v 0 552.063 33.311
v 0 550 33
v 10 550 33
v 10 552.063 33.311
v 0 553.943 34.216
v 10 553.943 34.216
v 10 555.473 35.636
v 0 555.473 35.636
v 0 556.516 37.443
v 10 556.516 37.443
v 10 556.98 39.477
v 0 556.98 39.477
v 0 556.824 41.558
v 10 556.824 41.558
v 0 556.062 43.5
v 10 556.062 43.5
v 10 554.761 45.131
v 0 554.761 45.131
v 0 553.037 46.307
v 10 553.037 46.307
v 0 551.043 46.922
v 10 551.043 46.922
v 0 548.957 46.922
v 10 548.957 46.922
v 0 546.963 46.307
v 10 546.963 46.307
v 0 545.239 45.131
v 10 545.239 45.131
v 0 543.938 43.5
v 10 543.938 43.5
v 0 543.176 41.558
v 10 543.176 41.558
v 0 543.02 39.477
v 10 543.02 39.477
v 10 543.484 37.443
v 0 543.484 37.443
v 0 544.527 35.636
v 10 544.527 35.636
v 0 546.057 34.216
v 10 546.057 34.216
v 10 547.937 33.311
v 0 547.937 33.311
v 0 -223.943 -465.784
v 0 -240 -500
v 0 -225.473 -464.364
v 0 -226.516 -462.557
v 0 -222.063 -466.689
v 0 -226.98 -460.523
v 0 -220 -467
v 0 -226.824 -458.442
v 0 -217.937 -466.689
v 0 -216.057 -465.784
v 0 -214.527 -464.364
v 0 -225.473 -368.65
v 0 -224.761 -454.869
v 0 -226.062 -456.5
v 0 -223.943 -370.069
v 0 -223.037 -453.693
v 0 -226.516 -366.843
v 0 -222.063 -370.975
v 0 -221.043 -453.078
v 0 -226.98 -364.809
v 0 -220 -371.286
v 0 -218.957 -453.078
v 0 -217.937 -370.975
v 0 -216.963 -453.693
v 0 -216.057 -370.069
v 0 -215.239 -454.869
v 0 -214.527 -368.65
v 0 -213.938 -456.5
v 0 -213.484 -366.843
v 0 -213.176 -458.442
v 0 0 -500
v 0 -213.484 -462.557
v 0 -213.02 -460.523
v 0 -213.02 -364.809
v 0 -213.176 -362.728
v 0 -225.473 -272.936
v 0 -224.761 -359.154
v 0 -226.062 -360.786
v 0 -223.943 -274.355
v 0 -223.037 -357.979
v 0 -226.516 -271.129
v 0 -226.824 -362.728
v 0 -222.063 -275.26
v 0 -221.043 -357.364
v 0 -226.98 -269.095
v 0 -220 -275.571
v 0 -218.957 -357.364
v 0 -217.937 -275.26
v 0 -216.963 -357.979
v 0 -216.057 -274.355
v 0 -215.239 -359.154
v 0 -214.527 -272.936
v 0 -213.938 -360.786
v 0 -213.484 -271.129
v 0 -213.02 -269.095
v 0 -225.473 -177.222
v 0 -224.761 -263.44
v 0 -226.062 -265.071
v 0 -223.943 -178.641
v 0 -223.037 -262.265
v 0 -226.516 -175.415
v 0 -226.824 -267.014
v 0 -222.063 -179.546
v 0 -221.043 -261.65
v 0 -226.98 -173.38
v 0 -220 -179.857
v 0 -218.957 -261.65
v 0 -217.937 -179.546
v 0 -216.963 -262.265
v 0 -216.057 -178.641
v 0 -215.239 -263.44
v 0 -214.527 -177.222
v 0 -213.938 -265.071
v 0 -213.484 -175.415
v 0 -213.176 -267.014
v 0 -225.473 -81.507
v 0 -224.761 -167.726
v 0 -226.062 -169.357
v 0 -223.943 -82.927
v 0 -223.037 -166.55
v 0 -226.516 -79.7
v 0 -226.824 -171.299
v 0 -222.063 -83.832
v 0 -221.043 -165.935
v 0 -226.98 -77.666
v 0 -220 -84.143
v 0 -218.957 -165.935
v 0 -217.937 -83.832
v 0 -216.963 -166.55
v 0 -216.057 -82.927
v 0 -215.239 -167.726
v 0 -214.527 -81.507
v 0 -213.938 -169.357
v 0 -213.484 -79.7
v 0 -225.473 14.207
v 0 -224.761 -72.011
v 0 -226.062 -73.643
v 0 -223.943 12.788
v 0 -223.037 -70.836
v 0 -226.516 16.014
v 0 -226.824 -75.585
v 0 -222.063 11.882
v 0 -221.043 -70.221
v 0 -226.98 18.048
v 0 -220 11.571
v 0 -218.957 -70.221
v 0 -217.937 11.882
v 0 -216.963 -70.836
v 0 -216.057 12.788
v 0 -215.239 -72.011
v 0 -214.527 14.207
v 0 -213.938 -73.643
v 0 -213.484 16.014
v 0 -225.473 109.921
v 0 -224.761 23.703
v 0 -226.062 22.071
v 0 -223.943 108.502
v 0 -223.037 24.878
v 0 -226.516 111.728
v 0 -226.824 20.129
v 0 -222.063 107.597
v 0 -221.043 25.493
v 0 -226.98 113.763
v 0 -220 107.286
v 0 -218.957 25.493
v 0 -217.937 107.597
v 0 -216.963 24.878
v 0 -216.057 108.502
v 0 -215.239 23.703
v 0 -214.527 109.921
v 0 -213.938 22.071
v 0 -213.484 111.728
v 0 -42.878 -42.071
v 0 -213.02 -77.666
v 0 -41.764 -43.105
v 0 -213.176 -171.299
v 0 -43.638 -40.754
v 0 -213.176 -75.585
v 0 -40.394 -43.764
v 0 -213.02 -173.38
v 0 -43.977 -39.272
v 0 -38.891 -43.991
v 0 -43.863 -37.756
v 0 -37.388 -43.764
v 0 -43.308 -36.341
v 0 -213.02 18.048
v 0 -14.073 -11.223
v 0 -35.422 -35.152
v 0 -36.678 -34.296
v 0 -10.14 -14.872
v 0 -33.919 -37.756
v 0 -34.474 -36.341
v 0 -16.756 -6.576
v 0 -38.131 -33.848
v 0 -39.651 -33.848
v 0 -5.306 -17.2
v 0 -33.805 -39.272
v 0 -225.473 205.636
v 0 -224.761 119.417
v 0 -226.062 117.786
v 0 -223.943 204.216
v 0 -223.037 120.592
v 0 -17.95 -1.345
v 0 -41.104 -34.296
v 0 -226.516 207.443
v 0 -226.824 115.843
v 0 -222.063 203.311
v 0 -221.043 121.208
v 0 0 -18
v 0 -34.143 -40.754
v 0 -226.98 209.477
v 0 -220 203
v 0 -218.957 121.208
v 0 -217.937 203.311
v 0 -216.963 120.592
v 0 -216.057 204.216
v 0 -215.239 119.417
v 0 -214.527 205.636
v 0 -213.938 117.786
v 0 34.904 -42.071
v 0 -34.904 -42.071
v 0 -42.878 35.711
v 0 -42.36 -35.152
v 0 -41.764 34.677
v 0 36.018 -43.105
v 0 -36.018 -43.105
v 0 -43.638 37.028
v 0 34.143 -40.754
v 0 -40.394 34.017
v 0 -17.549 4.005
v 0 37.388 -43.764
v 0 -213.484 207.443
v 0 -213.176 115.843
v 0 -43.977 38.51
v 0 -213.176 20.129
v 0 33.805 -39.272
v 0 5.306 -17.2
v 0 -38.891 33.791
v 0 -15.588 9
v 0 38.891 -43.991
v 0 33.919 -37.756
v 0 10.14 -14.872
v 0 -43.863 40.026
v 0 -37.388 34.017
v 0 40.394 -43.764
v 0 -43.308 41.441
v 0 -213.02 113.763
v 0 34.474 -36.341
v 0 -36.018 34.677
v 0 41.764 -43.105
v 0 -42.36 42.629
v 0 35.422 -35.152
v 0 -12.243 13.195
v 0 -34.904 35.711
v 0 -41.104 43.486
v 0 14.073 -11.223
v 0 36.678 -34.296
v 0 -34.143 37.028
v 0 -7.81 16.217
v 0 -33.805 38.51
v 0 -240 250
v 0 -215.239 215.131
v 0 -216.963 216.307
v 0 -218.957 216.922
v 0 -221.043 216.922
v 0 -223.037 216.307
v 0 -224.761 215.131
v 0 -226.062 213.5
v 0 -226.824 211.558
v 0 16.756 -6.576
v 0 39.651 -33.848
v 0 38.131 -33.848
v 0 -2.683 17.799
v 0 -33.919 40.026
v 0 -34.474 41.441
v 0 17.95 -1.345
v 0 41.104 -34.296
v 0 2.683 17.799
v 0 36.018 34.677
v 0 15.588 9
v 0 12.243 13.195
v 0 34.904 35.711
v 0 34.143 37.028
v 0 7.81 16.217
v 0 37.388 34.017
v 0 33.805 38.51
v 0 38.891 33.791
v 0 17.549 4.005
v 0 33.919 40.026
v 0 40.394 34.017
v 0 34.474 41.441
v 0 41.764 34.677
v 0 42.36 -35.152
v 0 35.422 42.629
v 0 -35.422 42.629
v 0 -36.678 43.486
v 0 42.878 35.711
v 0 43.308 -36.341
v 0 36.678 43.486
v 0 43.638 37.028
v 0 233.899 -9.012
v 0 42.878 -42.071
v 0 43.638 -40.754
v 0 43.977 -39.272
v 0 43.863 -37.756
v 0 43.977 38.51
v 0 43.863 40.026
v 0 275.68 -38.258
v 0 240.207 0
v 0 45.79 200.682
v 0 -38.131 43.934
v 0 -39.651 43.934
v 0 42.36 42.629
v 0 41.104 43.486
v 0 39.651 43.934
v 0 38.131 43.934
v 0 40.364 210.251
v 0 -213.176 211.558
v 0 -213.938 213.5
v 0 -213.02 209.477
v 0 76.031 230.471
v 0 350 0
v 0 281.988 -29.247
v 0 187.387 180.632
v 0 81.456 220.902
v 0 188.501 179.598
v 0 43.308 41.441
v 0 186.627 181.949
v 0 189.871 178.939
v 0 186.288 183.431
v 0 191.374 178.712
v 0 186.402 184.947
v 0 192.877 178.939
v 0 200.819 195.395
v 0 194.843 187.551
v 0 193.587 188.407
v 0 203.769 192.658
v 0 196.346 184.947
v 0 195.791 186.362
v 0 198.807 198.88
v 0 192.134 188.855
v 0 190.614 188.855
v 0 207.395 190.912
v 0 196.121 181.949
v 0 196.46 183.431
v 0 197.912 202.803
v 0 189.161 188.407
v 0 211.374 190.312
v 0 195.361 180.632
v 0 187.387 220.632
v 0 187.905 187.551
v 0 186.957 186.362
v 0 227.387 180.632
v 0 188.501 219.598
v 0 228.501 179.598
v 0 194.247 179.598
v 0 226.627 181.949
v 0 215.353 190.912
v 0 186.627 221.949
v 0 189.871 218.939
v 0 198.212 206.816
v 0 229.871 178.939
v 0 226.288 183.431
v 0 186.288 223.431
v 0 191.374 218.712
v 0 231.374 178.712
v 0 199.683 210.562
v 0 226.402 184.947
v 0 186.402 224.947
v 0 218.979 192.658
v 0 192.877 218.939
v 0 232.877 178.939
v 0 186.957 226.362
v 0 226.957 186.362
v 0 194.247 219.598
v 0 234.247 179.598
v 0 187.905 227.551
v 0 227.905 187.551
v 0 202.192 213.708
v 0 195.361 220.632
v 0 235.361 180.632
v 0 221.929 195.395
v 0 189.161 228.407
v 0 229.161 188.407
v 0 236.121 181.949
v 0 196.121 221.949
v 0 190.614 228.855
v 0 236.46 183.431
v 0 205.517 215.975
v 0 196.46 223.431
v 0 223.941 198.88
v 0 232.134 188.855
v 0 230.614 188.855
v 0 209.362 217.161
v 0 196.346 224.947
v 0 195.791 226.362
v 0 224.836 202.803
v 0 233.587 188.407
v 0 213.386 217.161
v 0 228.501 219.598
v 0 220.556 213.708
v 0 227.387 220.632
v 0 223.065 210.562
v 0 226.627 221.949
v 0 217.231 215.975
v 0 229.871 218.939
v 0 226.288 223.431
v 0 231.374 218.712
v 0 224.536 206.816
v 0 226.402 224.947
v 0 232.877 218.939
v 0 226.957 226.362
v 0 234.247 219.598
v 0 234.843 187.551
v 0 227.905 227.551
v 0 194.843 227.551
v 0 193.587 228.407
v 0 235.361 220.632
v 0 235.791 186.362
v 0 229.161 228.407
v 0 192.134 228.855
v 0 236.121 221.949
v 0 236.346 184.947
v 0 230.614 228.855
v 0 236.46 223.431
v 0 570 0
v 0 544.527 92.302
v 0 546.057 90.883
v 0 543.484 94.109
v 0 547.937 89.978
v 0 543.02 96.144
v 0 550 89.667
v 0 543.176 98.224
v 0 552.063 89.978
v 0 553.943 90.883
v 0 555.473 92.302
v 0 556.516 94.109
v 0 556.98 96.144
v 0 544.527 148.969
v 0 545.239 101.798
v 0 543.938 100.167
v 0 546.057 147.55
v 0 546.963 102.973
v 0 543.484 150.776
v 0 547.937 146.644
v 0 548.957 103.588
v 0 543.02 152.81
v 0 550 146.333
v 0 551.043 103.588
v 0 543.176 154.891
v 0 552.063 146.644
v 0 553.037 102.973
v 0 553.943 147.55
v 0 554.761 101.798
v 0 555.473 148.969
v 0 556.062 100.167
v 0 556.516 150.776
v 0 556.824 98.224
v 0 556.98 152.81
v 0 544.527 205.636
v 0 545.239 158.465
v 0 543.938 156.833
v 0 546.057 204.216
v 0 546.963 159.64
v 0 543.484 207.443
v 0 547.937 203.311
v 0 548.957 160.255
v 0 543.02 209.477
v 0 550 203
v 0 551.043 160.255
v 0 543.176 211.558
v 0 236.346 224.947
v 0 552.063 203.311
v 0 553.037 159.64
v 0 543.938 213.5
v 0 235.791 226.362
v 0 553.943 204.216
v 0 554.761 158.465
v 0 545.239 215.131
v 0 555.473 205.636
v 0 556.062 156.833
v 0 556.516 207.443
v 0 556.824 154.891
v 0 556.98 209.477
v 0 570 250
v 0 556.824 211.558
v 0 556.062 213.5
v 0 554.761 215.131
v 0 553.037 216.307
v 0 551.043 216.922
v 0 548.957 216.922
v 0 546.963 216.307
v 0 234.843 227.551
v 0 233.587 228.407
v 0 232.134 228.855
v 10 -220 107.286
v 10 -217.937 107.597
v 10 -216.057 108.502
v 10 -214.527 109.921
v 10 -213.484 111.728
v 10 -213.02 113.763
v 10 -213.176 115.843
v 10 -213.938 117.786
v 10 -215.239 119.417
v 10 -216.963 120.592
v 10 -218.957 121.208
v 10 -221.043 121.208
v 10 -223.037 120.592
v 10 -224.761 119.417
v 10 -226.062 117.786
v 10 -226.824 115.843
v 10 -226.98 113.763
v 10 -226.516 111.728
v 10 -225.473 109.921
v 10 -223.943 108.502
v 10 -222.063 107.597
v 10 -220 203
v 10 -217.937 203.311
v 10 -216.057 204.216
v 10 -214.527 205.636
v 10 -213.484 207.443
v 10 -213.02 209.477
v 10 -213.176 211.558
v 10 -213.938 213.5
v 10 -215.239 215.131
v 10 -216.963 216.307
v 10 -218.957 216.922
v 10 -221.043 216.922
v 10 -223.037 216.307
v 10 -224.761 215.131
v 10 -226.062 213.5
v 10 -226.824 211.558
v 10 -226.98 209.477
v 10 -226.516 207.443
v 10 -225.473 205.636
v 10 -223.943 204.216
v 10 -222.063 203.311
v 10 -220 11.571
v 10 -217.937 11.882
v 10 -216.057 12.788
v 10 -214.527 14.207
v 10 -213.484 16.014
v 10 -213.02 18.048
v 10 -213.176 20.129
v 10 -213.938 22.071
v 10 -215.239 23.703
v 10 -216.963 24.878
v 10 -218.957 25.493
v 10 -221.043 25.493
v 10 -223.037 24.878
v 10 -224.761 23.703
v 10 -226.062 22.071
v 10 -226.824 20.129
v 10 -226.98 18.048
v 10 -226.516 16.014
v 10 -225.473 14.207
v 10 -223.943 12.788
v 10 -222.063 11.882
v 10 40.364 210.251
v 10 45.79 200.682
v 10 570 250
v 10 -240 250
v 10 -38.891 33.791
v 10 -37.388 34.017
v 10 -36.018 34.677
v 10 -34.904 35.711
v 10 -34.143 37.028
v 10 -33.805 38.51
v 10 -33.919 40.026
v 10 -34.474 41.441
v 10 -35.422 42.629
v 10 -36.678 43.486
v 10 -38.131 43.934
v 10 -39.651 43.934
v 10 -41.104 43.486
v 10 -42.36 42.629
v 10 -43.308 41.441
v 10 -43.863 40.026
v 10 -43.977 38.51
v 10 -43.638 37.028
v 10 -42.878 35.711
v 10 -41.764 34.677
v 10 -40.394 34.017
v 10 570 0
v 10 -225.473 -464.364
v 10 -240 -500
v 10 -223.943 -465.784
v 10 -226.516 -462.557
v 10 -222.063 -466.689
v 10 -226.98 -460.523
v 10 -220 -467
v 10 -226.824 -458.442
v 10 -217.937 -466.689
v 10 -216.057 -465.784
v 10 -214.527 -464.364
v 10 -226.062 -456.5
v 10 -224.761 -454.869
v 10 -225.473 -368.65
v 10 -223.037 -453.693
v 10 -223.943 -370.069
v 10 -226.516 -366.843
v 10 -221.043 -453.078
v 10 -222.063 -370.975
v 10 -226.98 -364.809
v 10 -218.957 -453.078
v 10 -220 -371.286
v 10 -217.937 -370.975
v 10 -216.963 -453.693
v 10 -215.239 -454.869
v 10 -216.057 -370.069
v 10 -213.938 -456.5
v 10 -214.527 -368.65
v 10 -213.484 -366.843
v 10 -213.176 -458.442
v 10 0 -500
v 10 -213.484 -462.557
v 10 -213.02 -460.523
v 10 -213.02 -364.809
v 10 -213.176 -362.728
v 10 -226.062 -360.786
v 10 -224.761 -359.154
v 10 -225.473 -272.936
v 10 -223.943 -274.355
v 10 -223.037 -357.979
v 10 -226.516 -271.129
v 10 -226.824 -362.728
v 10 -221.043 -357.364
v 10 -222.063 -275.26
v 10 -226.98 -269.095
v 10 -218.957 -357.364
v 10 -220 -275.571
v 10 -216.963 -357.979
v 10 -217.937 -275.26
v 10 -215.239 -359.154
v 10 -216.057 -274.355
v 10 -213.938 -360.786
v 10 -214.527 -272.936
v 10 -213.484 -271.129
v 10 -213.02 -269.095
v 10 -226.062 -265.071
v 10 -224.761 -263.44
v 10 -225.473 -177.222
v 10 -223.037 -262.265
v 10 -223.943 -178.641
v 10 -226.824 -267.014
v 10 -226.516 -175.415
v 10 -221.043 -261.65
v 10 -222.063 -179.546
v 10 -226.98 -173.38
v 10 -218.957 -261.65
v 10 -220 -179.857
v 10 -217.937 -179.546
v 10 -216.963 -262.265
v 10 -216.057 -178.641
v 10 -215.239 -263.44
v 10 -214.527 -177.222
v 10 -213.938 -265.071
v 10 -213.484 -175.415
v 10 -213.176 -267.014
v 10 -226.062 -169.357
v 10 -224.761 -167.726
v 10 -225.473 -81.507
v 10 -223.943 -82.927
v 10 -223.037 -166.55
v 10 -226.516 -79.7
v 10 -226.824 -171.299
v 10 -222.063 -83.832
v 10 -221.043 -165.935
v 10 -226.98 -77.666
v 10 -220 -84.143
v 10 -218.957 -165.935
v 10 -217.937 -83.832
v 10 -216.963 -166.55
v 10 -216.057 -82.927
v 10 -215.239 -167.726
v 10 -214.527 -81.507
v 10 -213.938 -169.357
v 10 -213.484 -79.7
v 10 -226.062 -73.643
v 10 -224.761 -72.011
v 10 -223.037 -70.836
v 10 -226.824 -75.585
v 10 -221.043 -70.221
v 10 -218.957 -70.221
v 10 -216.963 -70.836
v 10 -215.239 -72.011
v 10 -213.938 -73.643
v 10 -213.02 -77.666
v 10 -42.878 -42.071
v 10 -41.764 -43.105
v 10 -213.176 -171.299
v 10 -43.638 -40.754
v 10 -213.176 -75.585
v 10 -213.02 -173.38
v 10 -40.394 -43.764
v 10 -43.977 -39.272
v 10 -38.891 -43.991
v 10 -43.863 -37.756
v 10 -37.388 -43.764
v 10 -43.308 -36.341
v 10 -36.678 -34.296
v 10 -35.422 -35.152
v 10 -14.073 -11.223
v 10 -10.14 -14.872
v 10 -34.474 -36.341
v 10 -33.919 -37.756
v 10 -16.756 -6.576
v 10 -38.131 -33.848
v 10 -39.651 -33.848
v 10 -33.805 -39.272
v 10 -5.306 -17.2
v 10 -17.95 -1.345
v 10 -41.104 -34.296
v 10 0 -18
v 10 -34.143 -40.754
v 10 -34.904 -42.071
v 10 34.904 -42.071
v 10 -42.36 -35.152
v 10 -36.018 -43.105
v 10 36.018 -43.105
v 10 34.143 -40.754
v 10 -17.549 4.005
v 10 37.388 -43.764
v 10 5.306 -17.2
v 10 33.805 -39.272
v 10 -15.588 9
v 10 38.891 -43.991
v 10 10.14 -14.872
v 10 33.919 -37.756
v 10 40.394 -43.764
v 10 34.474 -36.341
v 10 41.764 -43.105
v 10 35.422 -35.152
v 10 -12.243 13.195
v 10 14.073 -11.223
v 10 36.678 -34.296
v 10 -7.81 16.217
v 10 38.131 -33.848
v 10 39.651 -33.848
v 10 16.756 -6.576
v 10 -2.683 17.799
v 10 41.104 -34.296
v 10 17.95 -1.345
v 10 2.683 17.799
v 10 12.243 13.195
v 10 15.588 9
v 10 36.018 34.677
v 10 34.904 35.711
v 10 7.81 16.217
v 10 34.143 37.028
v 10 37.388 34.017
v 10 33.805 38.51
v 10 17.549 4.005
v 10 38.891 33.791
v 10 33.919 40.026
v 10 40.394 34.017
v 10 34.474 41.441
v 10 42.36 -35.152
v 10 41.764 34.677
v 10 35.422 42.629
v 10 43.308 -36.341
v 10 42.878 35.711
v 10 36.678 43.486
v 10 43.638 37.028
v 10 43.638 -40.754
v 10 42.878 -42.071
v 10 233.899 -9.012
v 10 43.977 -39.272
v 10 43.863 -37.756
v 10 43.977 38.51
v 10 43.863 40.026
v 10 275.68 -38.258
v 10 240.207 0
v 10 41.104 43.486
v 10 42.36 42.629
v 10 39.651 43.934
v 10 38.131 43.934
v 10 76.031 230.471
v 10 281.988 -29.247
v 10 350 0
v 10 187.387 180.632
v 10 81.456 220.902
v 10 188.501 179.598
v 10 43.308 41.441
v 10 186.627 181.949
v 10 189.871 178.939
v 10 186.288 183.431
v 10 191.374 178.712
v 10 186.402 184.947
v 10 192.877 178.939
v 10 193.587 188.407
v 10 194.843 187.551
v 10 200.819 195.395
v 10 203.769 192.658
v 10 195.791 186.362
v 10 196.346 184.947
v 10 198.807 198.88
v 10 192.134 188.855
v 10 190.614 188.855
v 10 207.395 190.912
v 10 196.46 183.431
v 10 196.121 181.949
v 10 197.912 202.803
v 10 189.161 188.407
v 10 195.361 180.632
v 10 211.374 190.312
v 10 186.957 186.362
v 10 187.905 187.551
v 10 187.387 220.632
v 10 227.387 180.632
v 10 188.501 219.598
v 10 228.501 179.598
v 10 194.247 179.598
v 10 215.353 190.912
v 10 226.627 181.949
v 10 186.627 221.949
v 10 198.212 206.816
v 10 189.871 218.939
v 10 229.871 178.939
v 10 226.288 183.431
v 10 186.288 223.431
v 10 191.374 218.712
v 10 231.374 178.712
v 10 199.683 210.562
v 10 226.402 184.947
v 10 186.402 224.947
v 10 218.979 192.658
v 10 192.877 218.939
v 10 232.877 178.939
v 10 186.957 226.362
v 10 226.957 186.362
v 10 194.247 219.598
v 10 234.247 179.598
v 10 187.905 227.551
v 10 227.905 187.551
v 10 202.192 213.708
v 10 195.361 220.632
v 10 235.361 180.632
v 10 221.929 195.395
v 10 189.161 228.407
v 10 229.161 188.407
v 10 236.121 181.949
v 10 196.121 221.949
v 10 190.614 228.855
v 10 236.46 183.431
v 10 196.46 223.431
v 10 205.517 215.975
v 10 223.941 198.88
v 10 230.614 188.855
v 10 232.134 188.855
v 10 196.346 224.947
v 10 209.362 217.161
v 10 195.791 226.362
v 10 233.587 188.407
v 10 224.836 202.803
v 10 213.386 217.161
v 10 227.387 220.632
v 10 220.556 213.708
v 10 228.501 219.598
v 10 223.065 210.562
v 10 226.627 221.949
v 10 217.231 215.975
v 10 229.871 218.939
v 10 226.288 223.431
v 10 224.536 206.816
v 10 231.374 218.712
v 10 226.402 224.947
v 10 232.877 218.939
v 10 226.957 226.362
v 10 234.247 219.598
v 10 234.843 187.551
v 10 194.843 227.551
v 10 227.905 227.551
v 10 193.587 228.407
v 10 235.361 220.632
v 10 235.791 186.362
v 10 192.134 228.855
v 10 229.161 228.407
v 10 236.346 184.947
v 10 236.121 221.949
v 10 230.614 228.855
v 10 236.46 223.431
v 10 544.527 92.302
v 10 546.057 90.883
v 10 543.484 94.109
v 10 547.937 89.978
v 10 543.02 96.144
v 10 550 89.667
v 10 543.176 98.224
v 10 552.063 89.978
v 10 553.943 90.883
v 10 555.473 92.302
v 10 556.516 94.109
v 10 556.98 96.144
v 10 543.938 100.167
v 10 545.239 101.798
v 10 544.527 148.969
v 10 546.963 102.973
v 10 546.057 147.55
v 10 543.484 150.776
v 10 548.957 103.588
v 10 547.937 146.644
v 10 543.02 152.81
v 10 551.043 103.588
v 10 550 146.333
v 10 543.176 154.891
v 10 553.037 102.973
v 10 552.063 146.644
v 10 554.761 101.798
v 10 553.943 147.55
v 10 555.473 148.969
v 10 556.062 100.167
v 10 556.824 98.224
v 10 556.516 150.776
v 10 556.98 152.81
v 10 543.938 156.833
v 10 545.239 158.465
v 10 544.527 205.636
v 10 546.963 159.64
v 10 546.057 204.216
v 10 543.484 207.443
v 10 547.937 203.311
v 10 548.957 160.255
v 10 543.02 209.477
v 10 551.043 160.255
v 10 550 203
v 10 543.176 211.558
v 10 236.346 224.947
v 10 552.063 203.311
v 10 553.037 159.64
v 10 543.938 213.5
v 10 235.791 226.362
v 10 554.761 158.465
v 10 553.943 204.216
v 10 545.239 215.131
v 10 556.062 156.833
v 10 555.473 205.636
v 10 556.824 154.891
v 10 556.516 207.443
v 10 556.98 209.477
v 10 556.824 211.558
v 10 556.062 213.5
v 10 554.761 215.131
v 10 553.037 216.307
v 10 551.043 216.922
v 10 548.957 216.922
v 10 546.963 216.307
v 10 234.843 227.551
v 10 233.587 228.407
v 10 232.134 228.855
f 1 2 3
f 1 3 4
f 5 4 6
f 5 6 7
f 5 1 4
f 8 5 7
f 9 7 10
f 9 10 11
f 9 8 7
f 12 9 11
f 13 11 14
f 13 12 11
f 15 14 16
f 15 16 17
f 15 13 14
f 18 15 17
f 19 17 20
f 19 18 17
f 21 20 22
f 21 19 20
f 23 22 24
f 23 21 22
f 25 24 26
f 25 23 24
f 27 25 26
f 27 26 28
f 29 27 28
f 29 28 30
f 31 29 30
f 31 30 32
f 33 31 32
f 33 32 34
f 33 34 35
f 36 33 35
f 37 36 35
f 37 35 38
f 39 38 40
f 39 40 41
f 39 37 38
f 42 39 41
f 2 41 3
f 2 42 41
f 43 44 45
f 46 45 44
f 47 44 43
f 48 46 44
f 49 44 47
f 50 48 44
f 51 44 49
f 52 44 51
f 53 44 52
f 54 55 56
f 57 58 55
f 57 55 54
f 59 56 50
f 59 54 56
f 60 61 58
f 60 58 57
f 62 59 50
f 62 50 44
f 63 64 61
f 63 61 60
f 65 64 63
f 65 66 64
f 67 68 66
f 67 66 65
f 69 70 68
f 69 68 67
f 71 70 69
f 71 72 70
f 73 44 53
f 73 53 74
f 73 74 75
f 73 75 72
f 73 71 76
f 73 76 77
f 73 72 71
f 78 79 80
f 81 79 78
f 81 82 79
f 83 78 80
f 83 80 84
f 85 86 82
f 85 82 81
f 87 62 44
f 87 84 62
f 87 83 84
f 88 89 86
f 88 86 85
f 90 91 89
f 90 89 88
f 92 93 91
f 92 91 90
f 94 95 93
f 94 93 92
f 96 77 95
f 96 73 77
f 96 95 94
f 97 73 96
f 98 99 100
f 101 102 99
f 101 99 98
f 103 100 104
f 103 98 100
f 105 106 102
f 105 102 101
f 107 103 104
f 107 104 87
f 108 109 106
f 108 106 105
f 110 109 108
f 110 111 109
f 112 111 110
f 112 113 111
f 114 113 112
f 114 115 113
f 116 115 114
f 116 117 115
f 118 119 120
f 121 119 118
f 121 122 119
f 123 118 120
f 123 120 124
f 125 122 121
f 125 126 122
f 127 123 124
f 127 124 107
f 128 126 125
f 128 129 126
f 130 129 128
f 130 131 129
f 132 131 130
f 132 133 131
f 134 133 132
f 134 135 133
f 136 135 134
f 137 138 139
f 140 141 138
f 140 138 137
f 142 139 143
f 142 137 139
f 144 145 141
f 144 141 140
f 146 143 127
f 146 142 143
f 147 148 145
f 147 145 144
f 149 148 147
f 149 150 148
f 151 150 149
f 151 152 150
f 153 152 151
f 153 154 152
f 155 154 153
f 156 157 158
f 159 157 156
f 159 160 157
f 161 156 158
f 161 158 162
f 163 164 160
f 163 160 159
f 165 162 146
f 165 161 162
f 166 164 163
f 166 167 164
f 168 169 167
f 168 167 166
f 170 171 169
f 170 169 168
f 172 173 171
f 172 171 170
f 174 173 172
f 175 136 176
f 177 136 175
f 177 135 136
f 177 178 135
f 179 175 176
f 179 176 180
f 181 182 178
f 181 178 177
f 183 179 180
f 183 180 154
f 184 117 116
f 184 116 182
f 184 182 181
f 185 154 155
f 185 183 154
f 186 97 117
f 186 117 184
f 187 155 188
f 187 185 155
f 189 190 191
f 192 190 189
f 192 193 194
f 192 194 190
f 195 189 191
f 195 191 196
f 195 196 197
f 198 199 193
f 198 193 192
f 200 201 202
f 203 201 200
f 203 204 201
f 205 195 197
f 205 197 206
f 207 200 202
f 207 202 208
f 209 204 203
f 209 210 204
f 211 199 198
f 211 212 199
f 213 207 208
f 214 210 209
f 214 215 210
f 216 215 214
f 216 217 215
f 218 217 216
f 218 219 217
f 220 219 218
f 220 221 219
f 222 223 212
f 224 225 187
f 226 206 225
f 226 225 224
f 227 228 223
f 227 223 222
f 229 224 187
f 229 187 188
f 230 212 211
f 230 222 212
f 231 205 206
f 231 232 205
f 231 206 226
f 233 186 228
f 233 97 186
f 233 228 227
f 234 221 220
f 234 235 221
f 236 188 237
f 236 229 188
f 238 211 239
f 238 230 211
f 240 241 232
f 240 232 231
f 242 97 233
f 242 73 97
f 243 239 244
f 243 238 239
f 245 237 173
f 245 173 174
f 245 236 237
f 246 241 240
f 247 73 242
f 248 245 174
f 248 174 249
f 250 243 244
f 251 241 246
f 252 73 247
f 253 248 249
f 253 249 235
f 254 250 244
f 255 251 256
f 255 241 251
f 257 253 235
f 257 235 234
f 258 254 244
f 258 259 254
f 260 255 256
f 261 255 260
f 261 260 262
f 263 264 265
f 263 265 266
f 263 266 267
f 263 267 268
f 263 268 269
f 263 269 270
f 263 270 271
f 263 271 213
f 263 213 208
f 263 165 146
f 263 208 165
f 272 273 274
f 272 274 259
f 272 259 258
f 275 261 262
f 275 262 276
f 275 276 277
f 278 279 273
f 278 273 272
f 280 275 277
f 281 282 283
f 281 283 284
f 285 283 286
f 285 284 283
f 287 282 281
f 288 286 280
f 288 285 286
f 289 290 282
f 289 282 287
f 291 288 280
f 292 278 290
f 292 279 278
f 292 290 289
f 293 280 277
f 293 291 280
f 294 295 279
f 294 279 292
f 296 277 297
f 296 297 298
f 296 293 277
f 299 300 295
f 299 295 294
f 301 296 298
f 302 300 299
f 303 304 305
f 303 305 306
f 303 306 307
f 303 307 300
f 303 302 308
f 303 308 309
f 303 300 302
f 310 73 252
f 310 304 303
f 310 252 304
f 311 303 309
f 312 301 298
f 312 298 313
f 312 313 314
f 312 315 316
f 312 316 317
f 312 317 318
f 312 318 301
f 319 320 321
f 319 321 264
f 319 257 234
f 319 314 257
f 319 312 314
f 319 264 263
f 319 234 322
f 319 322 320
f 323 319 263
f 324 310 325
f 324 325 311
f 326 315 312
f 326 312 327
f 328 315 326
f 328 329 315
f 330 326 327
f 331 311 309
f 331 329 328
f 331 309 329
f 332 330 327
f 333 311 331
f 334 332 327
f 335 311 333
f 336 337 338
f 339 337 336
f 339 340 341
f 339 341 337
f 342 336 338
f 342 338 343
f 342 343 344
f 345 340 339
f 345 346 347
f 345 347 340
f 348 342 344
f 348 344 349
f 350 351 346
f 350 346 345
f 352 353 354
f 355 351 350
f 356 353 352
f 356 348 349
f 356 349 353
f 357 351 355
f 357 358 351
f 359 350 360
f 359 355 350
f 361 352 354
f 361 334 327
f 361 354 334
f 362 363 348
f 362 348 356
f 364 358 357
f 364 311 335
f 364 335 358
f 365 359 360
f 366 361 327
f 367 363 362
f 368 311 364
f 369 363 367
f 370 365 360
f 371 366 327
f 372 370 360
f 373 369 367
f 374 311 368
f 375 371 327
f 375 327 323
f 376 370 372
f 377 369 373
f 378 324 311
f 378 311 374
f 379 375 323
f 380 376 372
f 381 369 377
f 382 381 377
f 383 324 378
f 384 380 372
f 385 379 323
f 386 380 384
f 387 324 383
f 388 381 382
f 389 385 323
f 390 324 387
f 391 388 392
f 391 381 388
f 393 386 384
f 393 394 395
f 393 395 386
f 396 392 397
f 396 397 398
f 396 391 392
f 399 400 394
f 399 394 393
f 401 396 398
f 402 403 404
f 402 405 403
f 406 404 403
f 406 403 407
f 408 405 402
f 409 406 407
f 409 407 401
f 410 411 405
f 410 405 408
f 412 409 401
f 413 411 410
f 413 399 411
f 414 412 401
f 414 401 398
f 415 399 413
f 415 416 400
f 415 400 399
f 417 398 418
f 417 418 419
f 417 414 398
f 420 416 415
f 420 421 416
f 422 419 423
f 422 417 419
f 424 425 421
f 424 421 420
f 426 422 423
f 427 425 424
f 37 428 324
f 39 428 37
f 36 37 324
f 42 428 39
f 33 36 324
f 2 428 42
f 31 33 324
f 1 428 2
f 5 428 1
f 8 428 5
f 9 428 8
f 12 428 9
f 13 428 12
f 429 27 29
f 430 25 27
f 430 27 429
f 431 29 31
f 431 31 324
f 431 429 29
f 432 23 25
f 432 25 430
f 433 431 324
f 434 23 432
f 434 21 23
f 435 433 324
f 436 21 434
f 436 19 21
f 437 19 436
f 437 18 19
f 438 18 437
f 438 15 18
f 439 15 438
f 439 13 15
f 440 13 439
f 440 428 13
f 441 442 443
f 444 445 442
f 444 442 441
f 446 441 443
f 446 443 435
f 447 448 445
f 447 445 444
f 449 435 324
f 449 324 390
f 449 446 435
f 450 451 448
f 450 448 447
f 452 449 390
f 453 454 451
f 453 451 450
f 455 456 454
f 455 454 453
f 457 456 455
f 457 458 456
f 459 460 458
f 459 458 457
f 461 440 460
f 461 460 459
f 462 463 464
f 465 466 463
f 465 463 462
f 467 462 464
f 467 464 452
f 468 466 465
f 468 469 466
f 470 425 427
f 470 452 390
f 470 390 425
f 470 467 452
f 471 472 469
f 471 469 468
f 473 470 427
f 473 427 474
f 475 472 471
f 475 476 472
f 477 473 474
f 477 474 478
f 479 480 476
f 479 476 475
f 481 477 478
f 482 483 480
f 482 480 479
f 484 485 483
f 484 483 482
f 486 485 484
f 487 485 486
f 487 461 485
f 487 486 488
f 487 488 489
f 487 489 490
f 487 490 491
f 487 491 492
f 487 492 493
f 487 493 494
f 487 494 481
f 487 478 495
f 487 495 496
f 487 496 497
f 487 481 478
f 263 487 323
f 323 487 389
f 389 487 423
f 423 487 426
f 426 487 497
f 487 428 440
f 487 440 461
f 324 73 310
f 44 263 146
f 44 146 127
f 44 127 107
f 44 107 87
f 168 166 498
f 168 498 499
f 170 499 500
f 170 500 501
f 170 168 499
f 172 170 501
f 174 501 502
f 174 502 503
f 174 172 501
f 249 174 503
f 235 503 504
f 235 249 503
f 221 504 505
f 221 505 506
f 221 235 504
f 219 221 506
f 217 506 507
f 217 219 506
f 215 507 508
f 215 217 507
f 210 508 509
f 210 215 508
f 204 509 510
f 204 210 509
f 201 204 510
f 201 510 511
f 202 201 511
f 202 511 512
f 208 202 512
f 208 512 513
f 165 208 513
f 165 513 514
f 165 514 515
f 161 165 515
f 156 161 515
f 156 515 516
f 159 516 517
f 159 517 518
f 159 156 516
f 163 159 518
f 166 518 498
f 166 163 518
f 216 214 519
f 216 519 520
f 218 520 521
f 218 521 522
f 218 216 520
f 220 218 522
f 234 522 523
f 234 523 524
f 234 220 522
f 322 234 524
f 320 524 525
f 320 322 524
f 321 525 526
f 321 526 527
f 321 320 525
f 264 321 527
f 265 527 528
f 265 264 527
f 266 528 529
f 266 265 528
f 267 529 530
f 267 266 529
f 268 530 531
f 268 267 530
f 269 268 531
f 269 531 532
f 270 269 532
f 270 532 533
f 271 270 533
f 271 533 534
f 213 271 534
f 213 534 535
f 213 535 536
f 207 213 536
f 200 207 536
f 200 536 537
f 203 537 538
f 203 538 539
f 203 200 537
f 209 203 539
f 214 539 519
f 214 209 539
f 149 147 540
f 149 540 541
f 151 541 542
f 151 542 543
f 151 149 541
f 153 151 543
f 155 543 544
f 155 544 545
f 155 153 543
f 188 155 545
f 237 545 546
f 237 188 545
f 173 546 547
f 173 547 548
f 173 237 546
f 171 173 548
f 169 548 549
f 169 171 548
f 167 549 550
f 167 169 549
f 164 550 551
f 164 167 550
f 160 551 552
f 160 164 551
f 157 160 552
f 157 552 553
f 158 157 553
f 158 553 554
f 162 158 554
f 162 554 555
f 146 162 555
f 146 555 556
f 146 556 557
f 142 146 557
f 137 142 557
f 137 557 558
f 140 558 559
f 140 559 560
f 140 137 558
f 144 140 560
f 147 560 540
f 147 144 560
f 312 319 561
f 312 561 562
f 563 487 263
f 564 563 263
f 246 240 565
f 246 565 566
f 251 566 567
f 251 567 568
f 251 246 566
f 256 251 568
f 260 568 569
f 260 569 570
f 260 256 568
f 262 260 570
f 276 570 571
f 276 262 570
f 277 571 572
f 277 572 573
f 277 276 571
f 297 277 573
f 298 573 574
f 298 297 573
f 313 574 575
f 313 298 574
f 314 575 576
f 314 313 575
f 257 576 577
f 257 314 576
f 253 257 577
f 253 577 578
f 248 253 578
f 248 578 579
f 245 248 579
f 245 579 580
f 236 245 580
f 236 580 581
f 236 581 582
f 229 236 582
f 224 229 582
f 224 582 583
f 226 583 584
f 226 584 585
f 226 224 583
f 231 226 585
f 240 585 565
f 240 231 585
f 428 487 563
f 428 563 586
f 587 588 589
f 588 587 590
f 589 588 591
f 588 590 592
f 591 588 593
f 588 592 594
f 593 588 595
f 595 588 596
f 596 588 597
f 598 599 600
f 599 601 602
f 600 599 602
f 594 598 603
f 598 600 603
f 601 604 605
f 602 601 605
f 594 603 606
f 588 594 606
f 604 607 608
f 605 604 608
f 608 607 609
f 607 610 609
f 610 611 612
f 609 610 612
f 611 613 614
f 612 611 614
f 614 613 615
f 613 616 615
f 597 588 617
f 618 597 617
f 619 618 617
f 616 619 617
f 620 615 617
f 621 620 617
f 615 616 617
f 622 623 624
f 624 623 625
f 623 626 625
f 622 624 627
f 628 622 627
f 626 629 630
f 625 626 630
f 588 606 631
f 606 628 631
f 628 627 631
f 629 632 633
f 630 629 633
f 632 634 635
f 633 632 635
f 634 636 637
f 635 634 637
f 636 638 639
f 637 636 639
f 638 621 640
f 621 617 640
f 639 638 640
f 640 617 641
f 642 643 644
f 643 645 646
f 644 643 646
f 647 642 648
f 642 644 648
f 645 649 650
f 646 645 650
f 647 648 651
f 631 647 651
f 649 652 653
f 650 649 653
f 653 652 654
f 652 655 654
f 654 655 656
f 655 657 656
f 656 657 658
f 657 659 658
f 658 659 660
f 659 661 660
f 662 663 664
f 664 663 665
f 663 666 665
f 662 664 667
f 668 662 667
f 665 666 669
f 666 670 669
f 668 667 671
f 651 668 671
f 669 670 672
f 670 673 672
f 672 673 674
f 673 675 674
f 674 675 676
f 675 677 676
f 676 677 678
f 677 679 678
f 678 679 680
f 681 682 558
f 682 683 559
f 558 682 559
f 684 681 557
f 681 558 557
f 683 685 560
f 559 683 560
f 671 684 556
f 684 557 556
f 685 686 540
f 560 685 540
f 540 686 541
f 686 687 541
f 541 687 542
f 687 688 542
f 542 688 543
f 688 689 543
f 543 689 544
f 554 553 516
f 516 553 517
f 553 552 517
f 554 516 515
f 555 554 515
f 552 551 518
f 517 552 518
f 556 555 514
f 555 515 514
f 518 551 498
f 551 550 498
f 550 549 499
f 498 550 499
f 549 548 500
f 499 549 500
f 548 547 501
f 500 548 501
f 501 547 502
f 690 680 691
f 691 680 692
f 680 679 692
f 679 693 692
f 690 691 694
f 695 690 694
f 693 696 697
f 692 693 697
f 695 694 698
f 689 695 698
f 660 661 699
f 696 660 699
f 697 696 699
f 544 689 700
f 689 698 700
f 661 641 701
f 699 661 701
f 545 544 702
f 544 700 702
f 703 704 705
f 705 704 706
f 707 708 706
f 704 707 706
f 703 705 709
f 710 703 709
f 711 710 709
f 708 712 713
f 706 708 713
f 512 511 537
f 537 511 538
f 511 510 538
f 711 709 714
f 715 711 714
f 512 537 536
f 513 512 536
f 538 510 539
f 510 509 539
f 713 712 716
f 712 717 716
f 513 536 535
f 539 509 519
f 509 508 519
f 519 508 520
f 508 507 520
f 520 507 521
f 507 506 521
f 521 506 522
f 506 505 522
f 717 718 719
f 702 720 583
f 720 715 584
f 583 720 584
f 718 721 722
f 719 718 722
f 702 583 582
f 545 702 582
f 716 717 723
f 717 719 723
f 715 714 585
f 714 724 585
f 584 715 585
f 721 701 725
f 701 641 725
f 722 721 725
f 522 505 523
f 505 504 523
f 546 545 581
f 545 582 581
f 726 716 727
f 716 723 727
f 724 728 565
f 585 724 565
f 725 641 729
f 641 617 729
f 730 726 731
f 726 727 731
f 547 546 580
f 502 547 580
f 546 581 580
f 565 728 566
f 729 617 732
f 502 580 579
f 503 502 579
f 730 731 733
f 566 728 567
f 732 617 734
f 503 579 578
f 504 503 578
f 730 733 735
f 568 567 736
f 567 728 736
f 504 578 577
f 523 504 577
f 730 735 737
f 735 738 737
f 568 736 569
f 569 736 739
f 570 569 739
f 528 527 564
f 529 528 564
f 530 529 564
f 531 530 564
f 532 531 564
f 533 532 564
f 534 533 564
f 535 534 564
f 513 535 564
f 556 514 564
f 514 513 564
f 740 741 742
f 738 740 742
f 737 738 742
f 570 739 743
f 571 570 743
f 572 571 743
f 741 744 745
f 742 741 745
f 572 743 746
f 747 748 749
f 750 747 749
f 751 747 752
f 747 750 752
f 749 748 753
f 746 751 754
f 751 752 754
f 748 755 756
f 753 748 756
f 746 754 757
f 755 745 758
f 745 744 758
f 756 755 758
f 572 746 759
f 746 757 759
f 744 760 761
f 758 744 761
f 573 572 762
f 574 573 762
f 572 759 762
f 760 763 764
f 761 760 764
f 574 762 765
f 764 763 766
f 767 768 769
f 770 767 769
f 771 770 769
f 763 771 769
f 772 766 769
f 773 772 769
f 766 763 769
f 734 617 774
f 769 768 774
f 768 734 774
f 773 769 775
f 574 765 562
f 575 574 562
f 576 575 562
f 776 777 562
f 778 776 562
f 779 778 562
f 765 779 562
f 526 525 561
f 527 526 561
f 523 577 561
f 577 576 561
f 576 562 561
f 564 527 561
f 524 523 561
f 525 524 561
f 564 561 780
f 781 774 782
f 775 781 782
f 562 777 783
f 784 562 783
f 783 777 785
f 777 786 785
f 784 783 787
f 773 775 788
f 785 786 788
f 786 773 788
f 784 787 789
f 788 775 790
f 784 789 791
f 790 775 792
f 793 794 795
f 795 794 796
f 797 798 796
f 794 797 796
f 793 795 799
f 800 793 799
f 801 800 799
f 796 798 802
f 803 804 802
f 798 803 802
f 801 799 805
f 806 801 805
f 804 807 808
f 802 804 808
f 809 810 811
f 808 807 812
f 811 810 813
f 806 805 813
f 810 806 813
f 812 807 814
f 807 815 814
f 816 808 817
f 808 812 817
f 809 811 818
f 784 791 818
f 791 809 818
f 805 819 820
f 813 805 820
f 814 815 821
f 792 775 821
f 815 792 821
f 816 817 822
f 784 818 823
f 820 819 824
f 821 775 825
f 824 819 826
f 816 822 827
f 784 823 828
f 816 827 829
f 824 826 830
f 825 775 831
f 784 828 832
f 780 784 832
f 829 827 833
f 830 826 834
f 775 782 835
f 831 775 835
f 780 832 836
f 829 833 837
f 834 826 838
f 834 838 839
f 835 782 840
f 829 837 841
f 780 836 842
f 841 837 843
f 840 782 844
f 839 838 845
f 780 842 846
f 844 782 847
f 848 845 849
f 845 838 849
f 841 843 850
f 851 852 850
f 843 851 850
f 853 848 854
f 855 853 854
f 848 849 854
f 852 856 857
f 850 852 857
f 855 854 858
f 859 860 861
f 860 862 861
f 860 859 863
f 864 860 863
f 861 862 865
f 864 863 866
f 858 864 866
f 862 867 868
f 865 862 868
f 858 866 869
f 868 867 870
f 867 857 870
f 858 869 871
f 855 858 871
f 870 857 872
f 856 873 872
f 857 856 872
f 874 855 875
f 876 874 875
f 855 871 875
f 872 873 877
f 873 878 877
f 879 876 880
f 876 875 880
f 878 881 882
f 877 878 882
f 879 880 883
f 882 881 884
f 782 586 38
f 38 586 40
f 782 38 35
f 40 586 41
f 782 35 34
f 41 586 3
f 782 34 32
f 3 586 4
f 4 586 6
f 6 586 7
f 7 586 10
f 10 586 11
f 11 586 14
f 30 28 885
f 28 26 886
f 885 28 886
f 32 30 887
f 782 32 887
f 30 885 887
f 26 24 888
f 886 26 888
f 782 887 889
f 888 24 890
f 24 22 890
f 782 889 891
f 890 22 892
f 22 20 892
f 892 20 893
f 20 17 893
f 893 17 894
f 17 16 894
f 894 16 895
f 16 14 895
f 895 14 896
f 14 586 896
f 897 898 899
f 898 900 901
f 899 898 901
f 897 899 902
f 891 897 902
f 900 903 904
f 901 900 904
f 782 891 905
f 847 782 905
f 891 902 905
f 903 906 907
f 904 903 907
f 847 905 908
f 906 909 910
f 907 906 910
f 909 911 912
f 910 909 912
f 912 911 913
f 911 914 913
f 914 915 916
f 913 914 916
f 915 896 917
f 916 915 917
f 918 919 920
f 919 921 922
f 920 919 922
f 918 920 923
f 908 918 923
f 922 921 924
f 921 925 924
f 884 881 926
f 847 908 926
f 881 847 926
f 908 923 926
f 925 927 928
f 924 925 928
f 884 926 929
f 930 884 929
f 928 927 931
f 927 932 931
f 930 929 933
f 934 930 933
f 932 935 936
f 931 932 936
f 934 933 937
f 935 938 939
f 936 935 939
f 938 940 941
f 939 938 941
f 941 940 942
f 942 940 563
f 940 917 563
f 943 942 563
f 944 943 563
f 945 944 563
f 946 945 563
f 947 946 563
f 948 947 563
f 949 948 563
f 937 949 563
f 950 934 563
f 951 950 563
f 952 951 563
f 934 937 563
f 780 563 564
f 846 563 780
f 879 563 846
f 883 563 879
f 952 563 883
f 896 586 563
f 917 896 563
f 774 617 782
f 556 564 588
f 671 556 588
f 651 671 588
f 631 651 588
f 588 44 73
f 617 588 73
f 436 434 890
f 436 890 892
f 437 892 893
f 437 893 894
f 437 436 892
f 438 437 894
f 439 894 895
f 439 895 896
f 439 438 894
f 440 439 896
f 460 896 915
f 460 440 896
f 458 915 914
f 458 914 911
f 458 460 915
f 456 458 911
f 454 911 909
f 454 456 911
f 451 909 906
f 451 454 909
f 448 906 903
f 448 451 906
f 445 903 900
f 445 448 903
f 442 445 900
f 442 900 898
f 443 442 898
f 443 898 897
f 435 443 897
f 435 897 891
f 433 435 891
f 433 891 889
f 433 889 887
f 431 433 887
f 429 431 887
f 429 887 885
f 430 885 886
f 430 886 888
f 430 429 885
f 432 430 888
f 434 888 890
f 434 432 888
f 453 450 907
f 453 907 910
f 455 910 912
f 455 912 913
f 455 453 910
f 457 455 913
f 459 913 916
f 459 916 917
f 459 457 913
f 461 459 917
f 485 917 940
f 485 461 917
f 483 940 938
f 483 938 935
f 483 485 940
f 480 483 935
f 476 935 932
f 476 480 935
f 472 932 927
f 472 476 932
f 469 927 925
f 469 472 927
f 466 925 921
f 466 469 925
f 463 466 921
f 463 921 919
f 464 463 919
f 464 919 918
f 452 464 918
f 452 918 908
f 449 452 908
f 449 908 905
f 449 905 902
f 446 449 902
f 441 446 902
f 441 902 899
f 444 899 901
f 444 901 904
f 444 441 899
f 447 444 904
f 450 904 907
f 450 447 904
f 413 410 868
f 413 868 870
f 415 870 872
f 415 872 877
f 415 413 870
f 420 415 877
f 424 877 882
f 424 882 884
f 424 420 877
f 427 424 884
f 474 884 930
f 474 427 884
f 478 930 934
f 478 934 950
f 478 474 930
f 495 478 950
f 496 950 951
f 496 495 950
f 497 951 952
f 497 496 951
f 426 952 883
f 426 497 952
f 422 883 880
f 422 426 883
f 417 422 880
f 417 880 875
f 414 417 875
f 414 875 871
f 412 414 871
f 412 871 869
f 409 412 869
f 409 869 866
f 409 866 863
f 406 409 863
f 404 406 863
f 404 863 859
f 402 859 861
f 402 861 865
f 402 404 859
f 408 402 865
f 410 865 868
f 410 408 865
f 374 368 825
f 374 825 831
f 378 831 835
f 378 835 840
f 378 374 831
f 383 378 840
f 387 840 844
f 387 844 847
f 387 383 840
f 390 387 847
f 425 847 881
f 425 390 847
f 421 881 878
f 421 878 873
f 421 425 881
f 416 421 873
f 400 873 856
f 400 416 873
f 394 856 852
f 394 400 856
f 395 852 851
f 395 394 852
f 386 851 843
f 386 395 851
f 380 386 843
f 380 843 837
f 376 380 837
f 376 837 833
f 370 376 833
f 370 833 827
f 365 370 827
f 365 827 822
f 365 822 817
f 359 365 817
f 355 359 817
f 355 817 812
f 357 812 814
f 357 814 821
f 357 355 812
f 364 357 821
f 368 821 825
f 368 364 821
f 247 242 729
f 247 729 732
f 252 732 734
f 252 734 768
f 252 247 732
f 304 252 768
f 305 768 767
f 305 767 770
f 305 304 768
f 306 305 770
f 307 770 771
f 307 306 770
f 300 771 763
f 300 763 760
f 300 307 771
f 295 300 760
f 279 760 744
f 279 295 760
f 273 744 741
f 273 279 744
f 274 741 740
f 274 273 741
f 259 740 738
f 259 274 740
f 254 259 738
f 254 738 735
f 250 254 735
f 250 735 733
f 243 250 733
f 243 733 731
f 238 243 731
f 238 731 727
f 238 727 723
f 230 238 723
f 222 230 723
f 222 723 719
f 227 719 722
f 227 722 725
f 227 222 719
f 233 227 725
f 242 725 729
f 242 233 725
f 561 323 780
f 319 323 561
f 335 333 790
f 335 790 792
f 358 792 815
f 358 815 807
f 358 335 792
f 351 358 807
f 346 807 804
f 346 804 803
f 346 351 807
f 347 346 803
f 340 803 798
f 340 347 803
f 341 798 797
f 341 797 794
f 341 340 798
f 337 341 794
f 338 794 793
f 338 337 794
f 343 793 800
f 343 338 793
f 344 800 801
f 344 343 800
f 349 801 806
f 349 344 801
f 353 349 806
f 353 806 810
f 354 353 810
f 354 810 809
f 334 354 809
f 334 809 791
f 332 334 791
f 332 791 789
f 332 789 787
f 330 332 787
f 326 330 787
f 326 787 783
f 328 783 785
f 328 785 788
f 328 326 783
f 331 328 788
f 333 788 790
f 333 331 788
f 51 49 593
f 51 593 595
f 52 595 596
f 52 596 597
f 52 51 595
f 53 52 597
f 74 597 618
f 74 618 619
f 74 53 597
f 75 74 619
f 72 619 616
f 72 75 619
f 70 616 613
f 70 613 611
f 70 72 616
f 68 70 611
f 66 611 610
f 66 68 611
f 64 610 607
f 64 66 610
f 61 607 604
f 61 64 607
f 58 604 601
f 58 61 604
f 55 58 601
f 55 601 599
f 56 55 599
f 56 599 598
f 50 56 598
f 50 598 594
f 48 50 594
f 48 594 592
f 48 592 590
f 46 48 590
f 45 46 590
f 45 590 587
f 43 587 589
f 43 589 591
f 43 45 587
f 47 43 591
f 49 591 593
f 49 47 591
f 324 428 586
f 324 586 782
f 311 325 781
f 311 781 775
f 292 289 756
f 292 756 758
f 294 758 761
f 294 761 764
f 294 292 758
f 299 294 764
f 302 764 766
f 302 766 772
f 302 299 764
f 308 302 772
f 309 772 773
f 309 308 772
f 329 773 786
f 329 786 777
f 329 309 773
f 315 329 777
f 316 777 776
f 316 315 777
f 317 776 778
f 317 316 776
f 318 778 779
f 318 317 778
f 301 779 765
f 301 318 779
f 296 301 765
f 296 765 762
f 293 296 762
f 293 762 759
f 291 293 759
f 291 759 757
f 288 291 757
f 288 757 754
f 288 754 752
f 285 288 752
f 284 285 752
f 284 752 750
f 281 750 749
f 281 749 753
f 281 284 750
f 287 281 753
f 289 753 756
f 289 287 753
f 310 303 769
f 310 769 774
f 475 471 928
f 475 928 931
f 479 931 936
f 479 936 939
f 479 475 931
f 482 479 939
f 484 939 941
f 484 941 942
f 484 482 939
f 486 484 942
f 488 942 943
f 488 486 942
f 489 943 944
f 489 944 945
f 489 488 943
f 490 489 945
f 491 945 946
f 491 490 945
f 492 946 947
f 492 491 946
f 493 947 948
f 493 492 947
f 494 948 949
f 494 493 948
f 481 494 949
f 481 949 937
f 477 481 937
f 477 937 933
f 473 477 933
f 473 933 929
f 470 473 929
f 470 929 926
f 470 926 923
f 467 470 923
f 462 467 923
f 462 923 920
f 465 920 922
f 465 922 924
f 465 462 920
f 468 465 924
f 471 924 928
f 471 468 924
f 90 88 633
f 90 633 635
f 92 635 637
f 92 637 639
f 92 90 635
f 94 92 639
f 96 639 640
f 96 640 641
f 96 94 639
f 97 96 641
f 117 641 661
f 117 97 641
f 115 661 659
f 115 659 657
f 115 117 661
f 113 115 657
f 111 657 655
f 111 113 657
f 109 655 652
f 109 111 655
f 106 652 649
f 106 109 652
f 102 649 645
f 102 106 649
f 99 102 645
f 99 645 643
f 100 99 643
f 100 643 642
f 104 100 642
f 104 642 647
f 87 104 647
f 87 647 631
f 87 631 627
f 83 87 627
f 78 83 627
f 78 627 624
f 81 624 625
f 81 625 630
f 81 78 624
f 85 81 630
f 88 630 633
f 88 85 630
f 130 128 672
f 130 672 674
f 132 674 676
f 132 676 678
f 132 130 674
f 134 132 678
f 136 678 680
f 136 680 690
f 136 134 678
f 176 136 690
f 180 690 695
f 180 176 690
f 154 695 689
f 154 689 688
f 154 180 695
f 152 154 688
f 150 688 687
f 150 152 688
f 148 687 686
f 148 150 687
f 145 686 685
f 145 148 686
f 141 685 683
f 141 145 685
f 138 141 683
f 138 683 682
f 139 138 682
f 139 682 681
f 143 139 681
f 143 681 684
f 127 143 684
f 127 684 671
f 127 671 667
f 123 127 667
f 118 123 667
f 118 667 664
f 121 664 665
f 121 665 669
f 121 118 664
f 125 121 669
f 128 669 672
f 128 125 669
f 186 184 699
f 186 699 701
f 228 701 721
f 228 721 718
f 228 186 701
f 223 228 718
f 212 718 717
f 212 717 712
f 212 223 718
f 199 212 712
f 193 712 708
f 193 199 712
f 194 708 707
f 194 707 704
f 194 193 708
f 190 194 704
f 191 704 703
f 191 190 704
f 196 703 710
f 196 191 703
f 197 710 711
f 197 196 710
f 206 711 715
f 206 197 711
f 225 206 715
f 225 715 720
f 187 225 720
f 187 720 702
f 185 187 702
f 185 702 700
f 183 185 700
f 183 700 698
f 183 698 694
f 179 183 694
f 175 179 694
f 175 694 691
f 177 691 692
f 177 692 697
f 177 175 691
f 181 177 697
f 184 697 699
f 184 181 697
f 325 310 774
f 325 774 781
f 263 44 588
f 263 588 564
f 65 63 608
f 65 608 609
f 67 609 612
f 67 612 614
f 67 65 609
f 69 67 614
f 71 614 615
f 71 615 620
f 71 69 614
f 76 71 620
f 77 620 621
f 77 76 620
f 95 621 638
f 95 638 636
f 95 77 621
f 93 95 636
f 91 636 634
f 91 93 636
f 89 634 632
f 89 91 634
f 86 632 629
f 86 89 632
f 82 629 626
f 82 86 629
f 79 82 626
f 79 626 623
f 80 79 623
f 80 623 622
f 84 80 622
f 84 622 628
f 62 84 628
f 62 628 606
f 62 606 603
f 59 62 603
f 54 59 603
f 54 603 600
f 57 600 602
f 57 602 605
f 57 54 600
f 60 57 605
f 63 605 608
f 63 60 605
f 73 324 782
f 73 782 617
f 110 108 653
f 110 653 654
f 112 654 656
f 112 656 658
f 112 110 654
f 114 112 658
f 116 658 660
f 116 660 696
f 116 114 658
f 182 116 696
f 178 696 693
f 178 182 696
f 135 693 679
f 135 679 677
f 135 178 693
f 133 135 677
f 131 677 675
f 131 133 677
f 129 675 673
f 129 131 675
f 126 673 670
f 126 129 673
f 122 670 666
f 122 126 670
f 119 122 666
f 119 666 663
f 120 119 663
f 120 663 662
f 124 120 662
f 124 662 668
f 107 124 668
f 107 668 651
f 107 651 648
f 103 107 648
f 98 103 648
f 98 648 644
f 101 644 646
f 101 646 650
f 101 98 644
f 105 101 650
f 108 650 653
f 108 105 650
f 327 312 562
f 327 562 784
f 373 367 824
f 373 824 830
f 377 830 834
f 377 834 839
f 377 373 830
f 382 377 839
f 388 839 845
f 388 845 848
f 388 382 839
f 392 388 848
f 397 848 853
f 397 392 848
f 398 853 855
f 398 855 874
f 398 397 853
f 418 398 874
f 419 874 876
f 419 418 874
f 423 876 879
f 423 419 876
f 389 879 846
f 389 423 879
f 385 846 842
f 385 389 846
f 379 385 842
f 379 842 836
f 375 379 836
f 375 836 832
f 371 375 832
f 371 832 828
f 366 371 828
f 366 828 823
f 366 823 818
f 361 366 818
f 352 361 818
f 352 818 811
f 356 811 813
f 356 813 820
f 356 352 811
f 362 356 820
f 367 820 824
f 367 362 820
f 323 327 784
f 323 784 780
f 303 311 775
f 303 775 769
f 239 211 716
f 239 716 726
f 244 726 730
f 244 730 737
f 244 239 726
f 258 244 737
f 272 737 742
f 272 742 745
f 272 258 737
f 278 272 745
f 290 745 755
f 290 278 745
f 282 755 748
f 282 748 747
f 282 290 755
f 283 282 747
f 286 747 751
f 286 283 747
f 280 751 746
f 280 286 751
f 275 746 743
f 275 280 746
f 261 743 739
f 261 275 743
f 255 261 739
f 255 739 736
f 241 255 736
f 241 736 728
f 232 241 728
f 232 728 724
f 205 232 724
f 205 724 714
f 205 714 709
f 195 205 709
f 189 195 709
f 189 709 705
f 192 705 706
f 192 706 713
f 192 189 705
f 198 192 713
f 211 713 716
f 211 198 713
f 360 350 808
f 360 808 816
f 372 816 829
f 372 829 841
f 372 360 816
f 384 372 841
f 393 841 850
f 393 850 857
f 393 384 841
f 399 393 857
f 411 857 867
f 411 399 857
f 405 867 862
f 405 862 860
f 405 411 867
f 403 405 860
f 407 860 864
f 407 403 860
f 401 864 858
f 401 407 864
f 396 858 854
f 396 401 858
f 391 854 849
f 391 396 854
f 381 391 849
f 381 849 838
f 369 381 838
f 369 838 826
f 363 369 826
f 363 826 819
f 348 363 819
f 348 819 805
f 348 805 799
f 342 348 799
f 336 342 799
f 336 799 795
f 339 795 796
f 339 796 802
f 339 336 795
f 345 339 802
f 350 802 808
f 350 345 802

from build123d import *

# Parameters (mm, degrees)
IZIM1_R                     = 13.5
IZIM1_R_2                   = 5.1
IZIM1_R_3                   = 18
IZIM1_R_4                   = 7
Y_KSEKLIK_EKSTR_ZYON1_DEPTH = 10


with BuildPart() as part:
    # Çizim1 → Yükseklik-Ekstrüzyon1 (new body)
    with BuildSketch(Plane(origin=(0, 0, 0), x_dir=(0, 0, -1), z_dir=(1, 0, 0))):
        Polygon((-250, 350), (-250, 570), (0, 570), (0, 350), (500, 0), (500, -200), (500, -240), (-250, -240), (-250, -200), align=None)
        with Locations((-203.812062632, 211.374016696)):
            Circle(IZIM1_R, mode=Mode.SUBTRACT)
        with Locations((-183.812062632, 231.374016696)):
            Circle(IZIM1_R_2, mode=Mode.SUBTRACT)
        with Locations((-223.812062632, 231.374016696)):
            Circle(IZIM1_R_2, mode=Mode.SUBTRACT)
        with Locations((-183.812062632, 191.374016696)):
            Circle(IZIM1_R_2, mode=Mode.SUBTRACT)
        with Locations((-223.812062632, 191.374016696)):
            Circle(IZIM1_R_2, mode=Mode.SUBTRACT)
        Circle(IZIM1_R_3, mode=Mode.SUBTRACT)
        with Locations((-38.890872965, 38.890872965)):
            Circle(IZIM1_R_2, mode=Mode.SUBTRACT)
        with Locations((38.890872965, 38.890872965)):
            Circle(IZIM1_R_2, mode=Mode.SUBTRACT)
        with Locations((38.890872965, -38.890872965)):
            Circle(IZIM1_R_2, mode=Mode.SUBTRACT)
        with Locations((-38.890872965, -38.890872965)):
            Circle(IZIM1_R_2, mode=Mode.SUBTRACT)
        with Locations((-210, 550)):
            Circle(IZIM1_R_4, mode=Mode.SUBTRACT)
        with Locations((-153.333333333, 550)):
            Circle(IZIM1_R_4, mode=Mode.SUBTRACT)
        with Locations((-96.666666667, 550)):
            Circle(IZIM1_R_4, mode=Mode.SUBTRACT)
        with Locations((-40, 550)):
            Circle(IZIM1_R_4, mode=Mode.SUBTRACT)
        with Locations((-210, -220)):
            Circle(IZIM1_R_4, mode=Mode.SUBTRACT)
        with Locations((-114.285714286, -220)):
            Circle(IZIM1_R_4, mode=Mode.SUBTRACT)
        with Locations((-18.571428571, -220)):
            Circle(IZIM1_R_4, mode=Mode.SUBTRACT)
        with Locations((77.142857143, -220)):
            Circle(IZIM1_R_4, mode=Mode.SUBTRACT)
        with Locations((172.857142857, -220)):
            Circle(IZIM1_R_4, mode=Mode.SUBTRACT)
        with Locations((268.571428571, -220)):
            Circle(IZIM1_R_4, mode=Mode.SUBTRACT)
        with Locations((364.285714286, -220)):
            Circle(IZIM1_R_4, mode=Mode.SUBTRACT)
        with Locations((460, -220)):
            Circle(IZIM1_R_4, mode=Mode.SUBTRACT)
        Polygon((29.246579563, 281.988117893), (0, 240.207289947), (9.011551126, 233.899204159), (38.258130688, 275.680032105), align=None, mode=Mode.SUBTRACT)
        Polygon((-200.681608906, 45.789510008), (-220.902149255, 81.456437938), (-230.471325041, 76.031414918), (-210.250784693, 40.364486987), align=None, mode=Mode.SUBTRACT)
    extrude(amount=Y_KSEKLIK_EKSTR_ZYON1_DEPTH)


solid = part.part
